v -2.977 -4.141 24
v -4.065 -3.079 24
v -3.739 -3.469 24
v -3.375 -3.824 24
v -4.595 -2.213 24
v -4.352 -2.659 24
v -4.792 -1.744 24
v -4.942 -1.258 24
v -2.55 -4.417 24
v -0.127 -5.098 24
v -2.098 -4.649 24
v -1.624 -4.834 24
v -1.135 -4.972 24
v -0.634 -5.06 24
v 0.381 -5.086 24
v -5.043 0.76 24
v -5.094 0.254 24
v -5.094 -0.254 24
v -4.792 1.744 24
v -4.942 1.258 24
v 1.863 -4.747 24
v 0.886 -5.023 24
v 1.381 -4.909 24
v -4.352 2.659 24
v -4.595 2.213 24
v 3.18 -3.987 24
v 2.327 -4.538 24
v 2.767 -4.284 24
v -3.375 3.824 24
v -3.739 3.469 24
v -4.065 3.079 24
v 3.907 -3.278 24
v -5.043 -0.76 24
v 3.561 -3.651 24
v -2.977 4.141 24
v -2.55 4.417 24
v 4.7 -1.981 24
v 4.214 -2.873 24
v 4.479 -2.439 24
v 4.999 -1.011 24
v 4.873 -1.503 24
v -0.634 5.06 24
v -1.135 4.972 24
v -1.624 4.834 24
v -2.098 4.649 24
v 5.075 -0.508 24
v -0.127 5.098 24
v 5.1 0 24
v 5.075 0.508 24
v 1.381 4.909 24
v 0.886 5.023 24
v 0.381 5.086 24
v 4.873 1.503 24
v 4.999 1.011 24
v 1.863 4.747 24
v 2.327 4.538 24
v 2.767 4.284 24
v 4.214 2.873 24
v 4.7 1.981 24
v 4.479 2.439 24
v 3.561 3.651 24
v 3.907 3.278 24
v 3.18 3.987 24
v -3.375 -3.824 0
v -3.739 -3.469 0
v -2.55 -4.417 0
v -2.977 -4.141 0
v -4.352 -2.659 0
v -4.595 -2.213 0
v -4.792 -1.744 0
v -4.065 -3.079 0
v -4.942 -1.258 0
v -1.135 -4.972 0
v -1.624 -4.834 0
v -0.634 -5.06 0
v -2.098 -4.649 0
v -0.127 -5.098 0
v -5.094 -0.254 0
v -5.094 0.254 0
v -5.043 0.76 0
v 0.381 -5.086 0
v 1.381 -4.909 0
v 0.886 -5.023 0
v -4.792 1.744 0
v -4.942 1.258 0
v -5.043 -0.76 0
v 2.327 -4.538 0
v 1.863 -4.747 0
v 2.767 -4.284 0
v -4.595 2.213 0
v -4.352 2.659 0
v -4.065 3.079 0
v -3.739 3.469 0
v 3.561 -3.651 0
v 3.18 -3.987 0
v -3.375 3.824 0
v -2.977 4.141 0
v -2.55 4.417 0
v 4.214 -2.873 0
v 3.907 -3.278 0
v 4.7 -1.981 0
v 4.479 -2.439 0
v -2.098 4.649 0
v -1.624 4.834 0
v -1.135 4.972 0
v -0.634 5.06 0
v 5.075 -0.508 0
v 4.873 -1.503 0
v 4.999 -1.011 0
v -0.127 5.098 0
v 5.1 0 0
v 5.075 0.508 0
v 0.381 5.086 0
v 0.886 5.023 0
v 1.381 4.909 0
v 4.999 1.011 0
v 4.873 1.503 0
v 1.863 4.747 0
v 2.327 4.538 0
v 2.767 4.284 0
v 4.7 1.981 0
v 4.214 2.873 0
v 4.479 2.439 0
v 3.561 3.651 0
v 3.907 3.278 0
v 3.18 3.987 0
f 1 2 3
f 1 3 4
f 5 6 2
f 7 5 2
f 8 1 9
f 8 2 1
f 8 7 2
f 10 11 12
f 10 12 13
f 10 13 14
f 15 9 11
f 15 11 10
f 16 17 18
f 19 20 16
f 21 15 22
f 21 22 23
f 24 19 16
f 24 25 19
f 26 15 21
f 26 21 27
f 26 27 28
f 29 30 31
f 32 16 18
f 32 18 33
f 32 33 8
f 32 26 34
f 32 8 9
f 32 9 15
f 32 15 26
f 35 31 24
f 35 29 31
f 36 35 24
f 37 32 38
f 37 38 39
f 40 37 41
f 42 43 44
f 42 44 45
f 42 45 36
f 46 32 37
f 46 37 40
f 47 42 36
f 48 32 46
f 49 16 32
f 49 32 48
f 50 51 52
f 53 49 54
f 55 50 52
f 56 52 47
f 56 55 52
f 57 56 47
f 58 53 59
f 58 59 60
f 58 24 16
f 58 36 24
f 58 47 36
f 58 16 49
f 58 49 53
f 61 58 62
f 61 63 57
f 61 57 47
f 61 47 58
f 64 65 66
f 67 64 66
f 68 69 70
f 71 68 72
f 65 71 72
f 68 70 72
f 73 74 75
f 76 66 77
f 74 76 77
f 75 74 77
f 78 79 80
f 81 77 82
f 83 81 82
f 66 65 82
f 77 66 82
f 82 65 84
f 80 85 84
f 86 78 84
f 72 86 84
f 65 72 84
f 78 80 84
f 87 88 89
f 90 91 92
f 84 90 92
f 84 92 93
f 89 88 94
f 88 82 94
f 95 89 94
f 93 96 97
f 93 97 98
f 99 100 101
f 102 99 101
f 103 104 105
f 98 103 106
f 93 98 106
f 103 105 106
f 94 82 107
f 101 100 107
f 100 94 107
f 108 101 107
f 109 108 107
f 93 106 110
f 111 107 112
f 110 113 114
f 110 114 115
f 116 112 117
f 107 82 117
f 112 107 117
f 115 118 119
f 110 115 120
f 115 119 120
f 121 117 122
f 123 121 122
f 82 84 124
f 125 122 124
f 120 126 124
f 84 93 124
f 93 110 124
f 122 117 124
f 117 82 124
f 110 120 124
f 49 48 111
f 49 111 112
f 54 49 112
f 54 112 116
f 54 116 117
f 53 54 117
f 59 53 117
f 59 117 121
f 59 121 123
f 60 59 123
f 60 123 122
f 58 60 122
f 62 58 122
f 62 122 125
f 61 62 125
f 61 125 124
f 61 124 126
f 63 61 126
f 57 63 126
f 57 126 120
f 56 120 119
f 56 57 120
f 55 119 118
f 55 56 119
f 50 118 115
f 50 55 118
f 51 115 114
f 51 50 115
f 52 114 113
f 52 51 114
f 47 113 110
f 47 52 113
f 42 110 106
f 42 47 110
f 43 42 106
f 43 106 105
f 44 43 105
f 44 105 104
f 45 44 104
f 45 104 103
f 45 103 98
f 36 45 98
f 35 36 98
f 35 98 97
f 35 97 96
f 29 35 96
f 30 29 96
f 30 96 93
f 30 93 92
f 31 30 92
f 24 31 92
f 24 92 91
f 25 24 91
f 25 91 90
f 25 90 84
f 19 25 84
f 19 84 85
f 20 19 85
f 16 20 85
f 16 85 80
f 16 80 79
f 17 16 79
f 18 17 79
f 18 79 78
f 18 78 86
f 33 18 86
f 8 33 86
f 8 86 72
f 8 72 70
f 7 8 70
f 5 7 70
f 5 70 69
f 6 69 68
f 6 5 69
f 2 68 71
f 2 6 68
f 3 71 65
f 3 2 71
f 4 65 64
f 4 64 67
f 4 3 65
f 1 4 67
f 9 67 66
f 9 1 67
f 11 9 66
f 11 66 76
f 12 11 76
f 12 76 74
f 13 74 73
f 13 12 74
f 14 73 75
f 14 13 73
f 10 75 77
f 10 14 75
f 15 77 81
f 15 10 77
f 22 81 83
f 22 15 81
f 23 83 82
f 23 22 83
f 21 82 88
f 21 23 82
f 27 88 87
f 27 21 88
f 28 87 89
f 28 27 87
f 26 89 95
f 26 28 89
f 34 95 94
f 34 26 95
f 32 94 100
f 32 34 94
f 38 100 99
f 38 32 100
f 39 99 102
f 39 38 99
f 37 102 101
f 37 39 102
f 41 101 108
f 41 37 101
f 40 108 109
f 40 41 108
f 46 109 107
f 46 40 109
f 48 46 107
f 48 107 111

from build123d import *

# Parameters (mm, degrees)
SKETCH_1_R          = 8
EXTRUDE_1_DEPTH     = 24
SKETCH_2_R          = 42
EXTRUDE_2_DEPTH     = 18
SKETCH_4_OUTSIDE_W  = 110.238
SKETCH_4_OUTSIDE_H  = 110.238
SKETCH_4_OUTSIDE_R  = 5.1
CUT_EXTRUDE_2_DEPTH = 65.062469512


with BuildPart() as part:
    # 草图1 → 凸台-拉伸1 (new body)
    with BuildSketch(Plane.XY):
        Circle(SKETCH_1_R)
    extrude(amount=EXTRUDE_1_DEPTH)

    # 草图2 → 凸台-拉伸2 (add)
    with BuildSketch(Plane.XY):
        Circle(SKETCH_2_R)
    extrude(amount=EXTRUDE_2_DEPTH)

    # 草图4 outside → 切除-拉伸2 (cut, through all)
    with BuildSketch(Plane.XY.offset(24)):
        Rectangle(SKETCH_4_OUTSIDE_W, SKETCH_4_OUTSIDE_H)
        Circle(SKETCH_4_OUTSIDE_R, mode=Mode.SUBTRACT)
    extrude(amount=-CUT_EXTRUDE_2_DEPTH, mode=Mode.SUBTRACT)


solid = part.part
